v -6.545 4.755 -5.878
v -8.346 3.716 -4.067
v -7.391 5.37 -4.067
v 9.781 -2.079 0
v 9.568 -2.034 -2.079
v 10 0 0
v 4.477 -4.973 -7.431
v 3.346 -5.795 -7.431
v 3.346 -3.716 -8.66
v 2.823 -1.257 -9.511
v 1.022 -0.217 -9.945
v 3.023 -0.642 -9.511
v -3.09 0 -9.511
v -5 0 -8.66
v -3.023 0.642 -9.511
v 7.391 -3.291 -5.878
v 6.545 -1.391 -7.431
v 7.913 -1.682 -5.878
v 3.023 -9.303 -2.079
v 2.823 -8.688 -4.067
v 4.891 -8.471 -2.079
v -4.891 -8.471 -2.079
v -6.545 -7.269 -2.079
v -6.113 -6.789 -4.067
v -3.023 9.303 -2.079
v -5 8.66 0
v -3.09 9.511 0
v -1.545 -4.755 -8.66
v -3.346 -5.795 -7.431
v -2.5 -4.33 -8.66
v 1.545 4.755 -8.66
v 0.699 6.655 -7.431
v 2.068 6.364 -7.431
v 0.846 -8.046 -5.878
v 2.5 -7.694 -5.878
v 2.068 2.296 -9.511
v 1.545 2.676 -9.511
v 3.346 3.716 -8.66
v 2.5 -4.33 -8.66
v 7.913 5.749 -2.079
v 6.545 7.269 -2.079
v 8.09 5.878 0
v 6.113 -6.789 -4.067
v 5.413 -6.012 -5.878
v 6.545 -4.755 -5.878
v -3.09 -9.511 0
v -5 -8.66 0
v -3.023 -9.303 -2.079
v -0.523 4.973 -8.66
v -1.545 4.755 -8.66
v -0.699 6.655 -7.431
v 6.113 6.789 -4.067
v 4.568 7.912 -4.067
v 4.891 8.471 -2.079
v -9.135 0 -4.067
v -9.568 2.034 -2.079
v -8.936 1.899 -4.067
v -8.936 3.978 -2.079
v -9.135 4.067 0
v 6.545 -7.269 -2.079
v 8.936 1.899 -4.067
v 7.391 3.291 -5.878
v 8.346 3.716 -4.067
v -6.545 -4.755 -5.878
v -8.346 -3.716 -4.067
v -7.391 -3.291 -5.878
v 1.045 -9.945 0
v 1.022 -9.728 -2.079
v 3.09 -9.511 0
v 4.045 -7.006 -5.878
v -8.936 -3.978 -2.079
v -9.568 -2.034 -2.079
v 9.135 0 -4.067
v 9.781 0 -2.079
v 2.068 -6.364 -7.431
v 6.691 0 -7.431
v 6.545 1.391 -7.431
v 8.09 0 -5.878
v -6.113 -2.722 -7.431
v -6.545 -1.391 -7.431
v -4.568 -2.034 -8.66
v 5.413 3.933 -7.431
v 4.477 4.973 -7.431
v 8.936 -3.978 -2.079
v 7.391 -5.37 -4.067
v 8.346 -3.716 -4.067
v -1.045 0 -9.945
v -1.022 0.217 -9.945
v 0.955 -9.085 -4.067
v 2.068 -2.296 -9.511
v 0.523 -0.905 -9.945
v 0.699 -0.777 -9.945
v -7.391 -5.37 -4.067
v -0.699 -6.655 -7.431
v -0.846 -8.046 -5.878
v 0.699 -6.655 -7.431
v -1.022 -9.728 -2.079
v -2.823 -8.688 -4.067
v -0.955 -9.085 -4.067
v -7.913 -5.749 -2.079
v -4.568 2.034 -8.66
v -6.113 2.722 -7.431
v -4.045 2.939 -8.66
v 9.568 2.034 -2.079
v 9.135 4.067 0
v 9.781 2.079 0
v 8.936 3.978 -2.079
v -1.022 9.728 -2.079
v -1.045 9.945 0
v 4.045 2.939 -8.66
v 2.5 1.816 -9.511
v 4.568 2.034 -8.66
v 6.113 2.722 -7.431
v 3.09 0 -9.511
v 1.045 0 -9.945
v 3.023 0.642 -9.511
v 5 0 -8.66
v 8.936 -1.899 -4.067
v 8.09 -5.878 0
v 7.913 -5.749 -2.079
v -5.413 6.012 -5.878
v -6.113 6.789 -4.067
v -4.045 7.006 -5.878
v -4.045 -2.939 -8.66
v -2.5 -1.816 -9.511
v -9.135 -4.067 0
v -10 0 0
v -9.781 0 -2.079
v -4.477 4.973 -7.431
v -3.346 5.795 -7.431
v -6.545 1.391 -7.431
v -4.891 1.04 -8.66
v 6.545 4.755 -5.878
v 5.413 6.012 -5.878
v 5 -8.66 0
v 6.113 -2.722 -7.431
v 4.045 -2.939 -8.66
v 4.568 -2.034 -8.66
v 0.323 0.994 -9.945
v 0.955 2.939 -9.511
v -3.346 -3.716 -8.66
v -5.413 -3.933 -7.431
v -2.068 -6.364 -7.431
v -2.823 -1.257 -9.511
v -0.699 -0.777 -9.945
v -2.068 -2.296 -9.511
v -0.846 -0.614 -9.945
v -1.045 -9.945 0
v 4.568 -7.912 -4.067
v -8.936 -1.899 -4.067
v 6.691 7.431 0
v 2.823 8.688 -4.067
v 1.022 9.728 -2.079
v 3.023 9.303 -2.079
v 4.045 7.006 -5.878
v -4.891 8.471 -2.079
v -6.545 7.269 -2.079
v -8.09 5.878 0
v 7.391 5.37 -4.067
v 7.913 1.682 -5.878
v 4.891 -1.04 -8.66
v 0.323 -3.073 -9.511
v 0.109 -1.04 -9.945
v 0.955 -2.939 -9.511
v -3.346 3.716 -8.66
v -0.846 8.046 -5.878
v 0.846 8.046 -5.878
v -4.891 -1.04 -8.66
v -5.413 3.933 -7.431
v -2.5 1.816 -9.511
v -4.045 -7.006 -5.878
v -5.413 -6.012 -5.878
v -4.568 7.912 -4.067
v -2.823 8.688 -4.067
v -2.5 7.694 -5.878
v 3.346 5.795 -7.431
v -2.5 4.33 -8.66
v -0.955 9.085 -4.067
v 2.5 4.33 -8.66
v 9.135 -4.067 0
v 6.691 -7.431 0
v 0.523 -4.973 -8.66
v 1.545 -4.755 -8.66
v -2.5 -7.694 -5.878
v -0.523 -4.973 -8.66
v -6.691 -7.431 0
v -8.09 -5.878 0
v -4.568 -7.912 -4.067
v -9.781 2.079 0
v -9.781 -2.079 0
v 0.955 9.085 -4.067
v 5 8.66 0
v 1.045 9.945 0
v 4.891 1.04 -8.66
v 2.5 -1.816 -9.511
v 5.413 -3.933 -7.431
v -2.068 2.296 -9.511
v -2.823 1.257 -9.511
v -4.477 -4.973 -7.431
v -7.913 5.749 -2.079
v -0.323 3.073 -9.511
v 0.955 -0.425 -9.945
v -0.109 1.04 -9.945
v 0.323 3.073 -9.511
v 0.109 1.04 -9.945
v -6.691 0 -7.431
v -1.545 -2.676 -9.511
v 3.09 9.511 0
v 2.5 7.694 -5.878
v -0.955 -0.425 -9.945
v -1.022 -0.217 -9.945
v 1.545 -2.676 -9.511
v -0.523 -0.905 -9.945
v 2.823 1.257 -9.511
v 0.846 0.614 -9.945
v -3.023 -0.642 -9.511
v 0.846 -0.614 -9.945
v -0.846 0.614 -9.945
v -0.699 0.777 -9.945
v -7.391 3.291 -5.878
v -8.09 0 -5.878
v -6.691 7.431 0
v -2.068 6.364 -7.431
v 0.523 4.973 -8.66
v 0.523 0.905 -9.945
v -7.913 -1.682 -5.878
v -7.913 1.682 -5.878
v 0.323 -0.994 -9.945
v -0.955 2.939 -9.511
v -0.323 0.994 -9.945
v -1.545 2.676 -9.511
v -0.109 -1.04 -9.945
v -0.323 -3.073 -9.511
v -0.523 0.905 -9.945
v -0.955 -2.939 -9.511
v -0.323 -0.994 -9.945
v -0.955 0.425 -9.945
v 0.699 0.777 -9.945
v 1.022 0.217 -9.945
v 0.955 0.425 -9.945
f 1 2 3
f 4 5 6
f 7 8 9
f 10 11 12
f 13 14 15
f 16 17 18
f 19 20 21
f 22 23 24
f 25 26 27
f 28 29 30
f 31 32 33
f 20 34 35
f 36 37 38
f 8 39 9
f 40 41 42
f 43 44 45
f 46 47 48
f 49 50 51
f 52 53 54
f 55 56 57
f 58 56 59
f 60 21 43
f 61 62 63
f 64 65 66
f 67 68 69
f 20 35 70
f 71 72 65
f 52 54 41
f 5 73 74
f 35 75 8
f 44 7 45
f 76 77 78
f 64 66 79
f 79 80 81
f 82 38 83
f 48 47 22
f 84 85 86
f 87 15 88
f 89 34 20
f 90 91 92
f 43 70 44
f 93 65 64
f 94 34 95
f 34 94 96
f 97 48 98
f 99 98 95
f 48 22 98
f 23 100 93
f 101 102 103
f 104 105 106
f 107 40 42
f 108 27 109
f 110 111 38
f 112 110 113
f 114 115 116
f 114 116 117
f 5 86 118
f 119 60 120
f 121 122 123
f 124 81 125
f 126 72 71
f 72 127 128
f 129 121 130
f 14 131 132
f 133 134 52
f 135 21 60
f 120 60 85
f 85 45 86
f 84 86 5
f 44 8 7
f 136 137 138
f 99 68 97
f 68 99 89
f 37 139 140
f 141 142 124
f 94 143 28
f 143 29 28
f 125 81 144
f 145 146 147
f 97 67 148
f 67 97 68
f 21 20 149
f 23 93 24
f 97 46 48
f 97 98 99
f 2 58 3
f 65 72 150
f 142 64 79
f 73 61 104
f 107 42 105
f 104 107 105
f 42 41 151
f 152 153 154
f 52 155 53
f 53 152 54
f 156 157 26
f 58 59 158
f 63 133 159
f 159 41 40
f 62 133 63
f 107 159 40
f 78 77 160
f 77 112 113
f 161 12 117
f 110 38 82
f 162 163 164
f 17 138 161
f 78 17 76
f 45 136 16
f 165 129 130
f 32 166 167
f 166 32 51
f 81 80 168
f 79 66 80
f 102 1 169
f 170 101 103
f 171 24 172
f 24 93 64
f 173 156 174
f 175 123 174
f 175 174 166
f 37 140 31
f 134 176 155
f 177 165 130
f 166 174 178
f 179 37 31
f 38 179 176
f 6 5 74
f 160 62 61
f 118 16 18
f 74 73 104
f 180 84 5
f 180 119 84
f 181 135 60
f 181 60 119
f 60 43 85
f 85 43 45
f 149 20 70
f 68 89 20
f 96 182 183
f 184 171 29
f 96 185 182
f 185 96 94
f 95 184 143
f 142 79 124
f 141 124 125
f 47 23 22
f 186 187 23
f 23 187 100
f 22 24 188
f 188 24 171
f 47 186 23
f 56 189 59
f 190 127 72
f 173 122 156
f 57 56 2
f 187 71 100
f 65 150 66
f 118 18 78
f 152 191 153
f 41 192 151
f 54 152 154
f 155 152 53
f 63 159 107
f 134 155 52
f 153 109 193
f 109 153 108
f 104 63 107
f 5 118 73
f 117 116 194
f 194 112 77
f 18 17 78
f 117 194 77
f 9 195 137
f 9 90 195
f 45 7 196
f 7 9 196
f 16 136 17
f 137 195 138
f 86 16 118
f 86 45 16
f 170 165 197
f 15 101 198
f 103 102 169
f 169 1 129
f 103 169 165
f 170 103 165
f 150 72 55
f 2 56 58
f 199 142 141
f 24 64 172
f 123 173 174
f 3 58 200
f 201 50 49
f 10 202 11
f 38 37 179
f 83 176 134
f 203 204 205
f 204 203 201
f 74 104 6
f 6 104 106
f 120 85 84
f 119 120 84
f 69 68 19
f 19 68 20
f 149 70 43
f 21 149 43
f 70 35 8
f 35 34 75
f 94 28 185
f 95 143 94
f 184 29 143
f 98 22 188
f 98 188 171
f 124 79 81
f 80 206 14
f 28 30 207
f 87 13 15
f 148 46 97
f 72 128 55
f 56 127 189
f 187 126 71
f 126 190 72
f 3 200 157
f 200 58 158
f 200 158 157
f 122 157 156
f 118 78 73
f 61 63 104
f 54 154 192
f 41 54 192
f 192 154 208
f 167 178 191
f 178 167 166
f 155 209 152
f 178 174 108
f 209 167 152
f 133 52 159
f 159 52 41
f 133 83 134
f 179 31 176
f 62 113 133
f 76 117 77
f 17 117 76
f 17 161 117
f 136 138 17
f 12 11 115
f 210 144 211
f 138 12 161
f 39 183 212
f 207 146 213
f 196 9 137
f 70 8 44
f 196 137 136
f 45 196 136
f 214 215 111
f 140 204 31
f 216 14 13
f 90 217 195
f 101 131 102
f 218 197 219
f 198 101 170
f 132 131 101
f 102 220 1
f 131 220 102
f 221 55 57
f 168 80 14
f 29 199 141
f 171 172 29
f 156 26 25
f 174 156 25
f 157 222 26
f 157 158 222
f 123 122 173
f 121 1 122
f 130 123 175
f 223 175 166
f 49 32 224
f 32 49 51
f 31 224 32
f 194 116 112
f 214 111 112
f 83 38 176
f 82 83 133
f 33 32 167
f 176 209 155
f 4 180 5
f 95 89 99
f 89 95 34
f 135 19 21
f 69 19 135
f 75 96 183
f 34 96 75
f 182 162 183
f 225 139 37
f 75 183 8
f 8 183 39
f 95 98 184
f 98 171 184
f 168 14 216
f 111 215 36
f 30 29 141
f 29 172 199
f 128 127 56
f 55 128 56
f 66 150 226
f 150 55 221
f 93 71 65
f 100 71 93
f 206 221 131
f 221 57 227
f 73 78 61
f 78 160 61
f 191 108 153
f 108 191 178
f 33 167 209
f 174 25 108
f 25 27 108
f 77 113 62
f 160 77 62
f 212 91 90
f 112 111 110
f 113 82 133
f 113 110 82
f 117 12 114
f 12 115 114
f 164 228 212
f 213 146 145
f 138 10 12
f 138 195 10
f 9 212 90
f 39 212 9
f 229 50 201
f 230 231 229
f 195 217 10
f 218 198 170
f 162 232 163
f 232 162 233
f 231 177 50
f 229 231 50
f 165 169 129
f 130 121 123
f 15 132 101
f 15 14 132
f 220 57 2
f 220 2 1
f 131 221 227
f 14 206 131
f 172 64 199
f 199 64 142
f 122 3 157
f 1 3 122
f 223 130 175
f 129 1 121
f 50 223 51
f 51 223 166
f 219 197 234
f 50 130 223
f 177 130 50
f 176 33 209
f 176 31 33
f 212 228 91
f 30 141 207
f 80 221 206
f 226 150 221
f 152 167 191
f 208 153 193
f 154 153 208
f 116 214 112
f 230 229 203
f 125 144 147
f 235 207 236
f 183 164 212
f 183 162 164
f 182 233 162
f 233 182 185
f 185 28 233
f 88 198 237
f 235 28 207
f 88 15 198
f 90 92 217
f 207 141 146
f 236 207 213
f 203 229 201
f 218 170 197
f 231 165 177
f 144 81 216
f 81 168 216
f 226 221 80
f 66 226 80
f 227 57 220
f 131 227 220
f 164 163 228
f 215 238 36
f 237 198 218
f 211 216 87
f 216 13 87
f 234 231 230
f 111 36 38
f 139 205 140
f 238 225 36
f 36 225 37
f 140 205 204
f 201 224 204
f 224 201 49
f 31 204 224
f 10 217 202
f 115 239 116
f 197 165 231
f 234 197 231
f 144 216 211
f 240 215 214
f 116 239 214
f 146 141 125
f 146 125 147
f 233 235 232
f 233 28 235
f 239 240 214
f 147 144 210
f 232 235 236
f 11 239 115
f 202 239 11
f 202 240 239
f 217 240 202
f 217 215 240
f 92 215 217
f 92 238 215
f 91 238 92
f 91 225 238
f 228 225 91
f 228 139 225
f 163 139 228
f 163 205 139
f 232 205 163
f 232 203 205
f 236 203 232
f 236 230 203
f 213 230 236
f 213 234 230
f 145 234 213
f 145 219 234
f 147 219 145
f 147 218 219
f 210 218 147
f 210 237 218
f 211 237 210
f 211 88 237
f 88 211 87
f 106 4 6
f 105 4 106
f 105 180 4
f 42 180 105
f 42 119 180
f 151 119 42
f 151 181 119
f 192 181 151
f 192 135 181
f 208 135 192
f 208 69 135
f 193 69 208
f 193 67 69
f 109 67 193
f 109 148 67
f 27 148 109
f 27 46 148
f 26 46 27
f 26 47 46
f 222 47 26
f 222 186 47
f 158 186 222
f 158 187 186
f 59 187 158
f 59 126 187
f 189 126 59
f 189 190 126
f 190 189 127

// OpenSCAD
/*
Author: Chris Correll
Date: 11/3/2021
Description: Cut a sphere in half. Then parameterize it!
URL: 
*/

//Global Variables
$fn=30;

//Lesson
//Non parameterized code

difference(){
    sphere(10);
    translate([0,0,5])
      cube([20,20,10],center=true);
}


/*
//Parameterized code
//Parameters
r_s=10;
difference(){
    sphere(r_s);
    translate([0,0,r_s/2])
      cube([r_s*2,r_s*2,r_s],center=true);
}
*/

//Homework
//Pizza slices
//Half pie pizza slice
/*h=1;
r=10;    
difference(){
    cylinder(h=h,r=r,center=true);
    translate([0,r/2,0])
      cube([r*2,r,h],center=true);
}*/

//Quarter pizza slice anywhere
/*h=1;
r=10;    
difference(){
    cylinder(h=h,r=r,center=true);
    translate([0,r/2,0])
      cube([r*2,r,h],center=true);
    translate([r/2,0,0])
      cube([r,r*2,h],center=true);
}*/

//BONUS: Quarter pizza slice in the adjacent quadrant
/*h=1;
r=10;    
difference(){
    cylinder(h=h,r=r,center=true);
    translate([0,-r/2,0])
      cube([r*2,r,h],center=true);
    translate([-r/2,0,0])
      cube([r,r*2,h],center=true);
}
*/
